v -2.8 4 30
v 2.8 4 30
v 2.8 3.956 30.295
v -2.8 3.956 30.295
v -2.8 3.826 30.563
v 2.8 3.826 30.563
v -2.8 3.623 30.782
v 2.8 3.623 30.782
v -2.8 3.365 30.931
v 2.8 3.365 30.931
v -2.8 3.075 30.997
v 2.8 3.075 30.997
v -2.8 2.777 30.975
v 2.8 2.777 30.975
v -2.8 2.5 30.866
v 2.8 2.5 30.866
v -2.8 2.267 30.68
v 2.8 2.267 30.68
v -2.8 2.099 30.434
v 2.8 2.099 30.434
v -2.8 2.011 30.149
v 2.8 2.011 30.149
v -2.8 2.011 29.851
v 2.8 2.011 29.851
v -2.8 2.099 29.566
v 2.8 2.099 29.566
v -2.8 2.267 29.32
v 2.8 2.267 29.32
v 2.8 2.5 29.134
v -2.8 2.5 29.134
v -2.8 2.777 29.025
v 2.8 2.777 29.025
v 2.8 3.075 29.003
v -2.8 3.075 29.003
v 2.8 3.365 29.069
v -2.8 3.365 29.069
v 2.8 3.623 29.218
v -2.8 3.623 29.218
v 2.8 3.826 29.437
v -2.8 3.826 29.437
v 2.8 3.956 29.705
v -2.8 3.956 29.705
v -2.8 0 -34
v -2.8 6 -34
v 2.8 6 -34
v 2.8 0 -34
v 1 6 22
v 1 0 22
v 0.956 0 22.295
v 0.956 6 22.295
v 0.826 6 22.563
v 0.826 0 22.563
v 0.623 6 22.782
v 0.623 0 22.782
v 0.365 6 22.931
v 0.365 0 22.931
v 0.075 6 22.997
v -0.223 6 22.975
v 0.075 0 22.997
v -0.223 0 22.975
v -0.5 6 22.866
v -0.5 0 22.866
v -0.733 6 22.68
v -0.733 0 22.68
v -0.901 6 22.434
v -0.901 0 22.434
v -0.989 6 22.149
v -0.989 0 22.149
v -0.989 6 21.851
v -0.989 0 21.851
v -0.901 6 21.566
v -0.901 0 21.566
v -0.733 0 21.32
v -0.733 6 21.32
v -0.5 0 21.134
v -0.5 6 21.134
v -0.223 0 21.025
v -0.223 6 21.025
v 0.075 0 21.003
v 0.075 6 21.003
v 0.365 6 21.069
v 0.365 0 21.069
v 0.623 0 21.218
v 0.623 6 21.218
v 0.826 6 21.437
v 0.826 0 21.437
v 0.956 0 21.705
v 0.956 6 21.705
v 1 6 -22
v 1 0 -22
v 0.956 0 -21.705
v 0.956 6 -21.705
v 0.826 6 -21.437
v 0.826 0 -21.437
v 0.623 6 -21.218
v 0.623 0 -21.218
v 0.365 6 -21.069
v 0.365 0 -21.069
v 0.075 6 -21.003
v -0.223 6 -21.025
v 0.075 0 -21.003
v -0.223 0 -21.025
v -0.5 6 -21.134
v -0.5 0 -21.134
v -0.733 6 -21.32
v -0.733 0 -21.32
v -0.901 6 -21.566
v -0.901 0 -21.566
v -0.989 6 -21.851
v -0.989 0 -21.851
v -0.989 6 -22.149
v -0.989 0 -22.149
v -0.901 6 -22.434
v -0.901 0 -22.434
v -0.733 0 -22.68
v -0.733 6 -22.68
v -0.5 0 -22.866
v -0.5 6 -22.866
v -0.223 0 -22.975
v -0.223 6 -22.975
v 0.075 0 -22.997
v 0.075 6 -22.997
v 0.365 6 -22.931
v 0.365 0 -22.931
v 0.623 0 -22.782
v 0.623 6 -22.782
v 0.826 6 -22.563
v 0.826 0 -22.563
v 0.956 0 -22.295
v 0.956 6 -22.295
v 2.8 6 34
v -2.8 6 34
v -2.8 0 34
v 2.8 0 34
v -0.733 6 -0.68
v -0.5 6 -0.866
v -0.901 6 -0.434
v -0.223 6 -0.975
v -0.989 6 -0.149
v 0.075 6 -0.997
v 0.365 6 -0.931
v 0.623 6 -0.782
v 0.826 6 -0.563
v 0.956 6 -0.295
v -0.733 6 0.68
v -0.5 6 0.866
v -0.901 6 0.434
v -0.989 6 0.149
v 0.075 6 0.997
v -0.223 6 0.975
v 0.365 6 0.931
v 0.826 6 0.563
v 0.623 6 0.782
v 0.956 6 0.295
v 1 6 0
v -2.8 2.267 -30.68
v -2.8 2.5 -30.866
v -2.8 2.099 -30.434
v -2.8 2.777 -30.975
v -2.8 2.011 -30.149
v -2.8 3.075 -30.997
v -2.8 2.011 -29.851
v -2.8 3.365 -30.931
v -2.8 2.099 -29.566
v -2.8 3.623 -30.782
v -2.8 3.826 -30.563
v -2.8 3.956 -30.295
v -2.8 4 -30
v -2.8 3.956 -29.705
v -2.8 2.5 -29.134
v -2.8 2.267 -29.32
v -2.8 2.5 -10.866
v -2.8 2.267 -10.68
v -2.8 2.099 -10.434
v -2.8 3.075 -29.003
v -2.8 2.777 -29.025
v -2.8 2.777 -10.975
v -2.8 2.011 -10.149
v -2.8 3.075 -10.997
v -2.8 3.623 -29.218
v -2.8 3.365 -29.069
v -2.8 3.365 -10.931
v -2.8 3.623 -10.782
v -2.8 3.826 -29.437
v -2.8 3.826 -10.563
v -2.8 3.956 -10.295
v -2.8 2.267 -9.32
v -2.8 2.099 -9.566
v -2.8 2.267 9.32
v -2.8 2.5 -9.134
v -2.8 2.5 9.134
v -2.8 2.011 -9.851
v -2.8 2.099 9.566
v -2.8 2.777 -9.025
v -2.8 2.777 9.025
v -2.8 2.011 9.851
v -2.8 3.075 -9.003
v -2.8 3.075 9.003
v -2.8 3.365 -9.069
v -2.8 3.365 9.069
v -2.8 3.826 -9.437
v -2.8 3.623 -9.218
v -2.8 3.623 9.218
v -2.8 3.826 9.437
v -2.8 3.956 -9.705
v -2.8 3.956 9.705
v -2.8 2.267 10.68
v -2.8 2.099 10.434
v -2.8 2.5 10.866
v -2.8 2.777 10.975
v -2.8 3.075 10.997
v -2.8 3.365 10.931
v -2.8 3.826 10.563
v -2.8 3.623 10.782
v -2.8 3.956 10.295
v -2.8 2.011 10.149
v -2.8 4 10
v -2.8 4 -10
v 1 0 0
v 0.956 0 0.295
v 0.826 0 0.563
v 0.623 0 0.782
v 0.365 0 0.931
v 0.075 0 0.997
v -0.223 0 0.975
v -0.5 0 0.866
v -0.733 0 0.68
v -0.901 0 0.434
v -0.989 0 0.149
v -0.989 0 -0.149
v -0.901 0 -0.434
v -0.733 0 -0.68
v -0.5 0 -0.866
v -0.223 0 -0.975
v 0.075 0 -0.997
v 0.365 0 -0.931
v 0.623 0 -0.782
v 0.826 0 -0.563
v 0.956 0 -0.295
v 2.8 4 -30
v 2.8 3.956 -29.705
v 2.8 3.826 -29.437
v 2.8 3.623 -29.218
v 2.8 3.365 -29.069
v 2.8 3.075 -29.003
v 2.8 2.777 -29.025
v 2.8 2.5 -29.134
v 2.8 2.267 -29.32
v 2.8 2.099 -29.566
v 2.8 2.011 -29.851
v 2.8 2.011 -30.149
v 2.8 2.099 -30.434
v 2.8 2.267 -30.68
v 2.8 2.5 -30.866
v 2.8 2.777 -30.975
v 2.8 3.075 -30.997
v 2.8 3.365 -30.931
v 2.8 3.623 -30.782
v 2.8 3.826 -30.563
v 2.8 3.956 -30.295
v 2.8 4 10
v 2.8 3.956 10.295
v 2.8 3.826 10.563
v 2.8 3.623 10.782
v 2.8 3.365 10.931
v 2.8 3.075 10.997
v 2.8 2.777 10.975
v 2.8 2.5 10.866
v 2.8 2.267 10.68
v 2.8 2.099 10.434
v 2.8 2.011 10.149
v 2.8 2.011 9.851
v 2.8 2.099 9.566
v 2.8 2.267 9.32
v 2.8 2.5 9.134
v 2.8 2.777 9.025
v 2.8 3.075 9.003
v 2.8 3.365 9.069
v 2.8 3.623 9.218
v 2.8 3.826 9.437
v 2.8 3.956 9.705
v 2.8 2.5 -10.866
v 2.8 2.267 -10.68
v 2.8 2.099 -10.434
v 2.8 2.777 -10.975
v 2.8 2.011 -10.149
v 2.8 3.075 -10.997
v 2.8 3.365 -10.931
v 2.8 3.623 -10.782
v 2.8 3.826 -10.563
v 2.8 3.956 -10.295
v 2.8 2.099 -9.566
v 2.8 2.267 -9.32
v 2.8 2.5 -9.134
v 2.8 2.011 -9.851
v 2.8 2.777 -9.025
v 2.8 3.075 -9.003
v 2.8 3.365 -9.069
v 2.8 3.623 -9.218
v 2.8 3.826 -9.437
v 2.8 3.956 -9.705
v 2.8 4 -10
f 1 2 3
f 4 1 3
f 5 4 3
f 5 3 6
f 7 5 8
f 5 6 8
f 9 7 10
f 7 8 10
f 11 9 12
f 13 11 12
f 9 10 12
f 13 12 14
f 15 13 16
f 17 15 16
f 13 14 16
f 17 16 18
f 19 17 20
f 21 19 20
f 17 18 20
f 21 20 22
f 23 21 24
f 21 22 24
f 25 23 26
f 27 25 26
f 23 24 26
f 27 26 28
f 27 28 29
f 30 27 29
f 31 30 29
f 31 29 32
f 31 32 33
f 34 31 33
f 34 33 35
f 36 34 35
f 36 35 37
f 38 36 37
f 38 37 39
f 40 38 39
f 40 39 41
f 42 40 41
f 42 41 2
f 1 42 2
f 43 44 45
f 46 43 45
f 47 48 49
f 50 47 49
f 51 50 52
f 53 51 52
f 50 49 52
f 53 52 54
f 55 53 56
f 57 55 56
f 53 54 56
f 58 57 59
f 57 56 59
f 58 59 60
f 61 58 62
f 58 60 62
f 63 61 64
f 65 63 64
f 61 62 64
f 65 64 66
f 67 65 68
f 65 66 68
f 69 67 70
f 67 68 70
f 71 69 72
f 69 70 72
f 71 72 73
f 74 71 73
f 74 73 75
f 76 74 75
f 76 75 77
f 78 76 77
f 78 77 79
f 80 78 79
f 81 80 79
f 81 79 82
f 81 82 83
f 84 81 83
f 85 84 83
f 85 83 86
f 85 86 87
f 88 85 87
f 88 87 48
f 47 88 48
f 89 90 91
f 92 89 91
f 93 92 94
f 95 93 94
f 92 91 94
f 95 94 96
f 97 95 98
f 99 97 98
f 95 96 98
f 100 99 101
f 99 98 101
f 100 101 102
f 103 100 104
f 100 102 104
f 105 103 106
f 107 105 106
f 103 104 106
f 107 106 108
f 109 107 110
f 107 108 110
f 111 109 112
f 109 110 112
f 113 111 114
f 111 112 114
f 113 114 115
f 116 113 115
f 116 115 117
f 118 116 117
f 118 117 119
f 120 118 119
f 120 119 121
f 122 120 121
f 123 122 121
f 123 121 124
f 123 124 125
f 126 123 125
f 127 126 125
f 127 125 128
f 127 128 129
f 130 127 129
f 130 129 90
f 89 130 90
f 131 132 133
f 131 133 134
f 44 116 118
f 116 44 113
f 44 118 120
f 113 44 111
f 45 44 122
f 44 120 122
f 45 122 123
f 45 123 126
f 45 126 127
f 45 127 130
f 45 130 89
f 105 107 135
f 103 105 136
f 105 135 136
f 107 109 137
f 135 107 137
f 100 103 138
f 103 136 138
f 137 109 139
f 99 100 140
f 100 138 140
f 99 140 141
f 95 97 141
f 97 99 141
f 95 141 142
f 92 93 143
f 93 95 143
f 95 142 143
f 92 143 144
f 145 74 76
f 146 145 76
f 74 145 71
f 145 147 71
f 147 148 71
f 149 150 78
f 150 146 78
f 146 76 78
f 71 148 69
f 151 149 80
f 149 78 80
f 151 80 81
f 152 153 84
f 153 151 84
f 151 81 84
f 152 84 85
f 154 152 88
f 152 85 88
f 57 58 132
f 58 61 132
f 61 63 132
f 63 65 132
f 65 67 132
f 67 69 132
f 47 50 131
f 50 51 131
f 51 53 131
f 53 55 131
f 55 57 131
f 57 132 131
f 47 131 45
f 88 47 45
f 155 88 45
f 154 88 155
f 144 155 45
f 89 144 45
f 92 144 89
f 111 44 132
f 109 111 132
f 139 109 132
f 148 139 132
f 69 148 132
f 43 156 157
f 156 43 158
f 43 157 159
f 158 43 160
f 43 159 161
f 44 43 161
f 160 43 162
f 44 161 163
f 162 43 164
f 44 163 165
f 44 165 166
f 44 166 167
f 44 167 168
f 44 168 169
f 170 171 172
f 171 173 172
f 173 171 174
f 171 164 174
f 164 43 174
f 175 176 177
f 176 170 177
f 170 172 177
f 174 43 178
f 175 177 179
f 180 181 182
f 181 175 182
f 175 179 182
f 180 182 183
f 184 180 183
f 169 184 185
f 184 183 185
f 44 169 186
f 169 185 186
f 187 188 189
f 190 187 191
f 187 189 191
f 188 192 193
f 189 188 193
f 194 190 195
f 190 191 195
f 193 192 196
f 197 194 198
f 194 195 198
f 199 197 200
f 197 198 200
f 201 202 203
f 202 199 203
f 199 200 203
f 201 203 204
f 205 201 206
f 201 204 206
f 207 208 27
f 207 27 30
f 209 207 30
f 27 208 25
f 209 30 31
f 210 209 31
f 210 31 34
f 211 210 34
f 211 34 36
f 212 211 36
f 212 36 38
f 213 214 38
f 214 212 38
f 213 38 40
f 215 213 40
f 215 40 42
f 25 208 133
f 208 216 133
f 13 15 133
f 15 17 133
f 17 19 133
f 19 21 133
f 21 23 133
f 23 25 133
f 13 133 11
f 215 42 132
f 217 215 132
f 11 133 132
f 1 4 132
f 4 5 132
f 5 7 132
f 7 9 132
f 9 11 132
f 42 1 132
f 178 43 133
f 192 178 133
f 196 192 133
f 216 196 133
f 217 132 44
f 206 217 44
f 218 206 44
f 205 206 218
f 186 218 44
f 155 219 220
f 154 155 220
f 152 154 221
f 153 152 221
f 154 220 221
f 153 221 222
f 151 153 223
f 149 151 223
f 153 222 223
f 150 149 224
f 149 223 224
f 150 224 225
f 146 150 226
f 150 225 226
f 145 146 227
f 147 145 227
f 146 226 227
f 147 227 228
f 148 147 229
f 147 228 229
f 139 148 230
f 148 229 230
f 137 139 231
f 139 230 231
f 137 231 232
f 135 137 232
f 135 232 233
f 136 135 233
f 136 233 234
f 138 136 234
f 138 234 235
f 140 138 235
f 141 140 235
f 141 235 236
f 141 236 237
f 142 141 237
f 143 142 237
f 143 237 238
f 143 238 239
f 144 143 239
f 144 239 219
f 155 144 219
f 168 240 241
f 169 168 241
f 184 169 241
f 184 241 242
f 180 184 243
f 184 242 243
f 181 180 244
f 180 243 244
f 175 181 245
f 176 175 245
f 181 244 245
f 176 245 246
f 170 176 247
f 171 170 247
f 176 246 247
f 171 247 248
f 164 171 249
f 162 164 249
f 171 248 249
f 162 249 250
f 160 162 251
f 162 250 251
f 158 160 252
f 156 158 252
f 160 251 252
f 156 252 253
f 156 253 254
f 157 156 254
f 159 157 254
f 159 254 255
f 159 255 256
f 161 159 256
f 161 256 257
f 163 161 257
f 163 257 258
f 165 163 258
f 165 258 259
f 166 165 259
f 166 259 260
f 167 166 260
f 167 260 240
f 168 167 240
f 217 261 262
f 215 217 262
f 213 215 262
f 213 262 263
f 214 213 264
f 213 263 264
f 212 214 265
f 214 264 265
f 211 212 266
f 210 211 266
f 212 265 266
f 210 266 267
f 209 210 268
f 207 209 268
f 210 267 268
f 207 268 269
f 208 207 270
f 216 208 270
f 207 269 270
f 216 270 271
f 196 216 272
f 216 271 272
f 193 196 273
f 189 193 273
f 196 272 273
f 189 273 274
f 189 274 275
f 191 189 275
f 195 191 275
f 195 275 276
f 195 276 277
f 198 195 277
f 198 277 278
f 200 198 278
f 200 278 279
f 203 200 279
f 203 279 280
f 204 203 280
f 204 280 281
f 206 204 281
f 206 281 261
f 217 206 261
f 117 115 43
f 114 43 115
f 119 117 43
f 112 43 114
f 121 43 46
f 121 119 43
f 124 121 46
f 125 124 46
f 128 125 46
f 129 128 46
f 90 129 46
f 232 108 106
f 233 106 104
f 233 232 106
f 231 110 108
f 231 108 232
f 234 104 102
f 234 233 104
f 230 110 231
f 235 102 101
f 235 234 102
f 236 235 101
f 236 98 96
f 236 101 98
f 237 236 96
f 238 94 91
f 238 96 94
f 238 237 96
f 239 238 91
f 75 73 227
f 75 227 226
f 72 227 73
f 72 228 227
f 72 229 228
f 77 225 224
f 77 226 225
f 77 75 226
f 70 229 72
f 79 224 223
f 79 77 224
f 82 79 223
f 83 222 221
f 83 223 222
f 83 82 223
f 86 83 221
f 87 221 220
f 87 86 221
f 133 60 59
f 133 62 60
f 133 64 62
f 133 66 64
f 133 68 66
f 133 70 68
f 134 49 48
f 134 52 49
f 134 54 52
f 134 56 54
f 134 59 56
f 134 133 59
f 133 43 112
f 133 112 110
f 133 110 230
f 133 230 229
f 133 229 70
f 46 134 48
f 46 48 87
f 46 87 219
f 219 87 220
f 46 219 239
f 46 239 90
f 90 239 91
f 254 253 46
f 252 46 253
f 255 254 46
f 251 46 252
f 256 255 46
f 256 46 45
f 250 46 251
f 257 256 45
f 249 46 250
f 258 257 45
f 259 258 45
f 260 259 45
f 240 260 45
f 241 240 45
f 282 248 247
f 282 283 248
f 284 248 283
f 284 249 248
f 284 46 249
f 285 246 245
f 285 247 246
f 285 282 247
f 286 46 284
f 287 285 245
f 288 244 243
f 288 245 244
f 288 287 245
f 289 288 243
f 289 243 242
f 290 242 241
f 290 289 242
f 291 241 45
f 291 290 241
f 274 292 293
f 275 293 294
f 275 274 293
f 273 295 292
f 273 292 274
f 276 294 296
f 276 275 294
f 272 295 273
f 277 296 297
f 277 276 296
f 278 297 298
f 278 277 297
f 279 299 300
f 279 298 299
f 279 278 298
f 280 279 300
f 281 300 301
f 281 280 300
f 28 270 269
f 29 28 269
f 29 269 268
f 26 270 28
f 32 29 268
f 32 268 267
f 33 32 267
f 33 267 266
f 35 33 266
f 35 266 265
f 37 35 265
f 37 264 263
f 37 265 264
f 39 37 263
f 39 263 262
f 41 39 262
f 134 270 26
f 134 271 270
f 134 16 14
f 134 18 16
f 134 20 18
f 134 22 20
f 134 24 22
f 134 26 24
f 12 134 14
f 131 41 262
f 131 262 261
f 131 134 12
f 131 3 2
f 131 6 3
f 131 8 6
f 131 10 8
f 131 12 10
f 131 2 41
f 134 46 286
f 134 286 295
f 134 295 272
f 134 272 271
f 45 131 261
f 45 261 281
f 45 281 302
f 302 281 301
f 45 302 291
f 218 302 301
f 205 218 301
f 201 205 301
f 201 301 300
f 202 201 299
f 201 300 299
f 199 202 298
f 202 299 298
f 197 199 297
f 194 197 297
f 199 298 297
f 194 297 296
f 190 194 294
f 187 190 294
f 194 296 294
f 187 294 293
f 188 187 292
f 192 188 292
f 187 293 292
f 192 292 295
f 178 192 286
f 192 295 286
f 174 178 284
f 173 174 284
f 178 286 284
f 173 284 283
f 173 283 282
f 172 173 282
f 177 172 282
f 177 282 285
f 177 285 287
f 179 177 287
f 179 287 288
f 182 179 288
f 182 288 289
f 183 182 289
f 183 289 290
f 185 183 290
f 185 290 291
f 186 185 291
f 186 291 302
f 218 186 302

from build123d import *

# Parameters (mm, degrees)
SKETCH_1_W          = 5.6
SKETCH_1_H          = 6
EXTRUDE_1_DEPTH     = 34
CUT_EXTRUDE_3_REACH = 36.639
SKETCH_4_R          = 1
CUT_EXTRUDE_4_REACH = 36.977
SKETCH_5_R          = 1


with BuildPart() as part:
    # 草图1 → 凸台-拉伸1 (new, symmetric)
    with BuildSketch(Plane.XY):
        with Locations((0, 3)):
            Rectangle(SKETCH_1_W, SKETCH_1_H)
    extrude(amount=EXTRUDE_1_DEPTH, both=True)

    # 草图4 → 切除-拉伸3 (cut, up to next)
    with BuildSketch(Plane.XZ, mode=Mode.PRIVATE) as cut_extrude_3_sk1:
        Circle(SKETCH_4_R)
    cut_extrude_3_tool1 = extrude(cut_extrude_3_sk1.sketch, amount=-CUT_EXTRUDE_3_REACH, mode=Mode.PRIVATE) & part.part
    # 草图4 → 切除-拉伸3 (cut, up to next)
    with BuildSketch(Plane.XZ, mode=Mode.PRIVATE) as cut_extrude_3_sk2:
        with Locations((0, 22)):
            Circle(SKETCH_4_R)
    cut_extrude_3_tool2 = extrude(cut_extrude_3_sk2.sketch, amount=-CUT_EXTRUDE_3_REACH, mode=Mode.PRIVATE) & part.part
    # 草图4 → 切除-拉伸3 (cut, up to next)
    with BuildSketch(Plane.XZ, mode=Mode.PRIVATE) as cut_extrude_3_sk3:
        with Locations((0, -22)):
            Circle(SKETCH_4_R)
    cut_extrude_3_tool3 = extrude(cut_extrude_3_sk3.sketch, amount=-CUT_EXTRUDE_3_REACH, mode=Mode.PRIVATE) & part.part
    add(cut_extrude_3_tool1.solids().sort_by_distance((0, 0, 0))[0], mode=Mode.SUBTRACT)
    add(cut_extrude_3_tool2.solids().sort_by_distance((0, 0, 22))[0], mode=Mode.SUBTRACT)
    add(cut_extrude_3_tool3.solids().sort_by_distance((0, 0, -22))[0], mode=Mode.SUBTRACT)

    # 草图5 → 切除-拉伸4 (cut, up to next)
    with BuildSketch(Plane(origin=(2.8, 0, 0), x_dir=(0, 0, -1), z_dir=(1, 0, 0)), mode=Mode.PRIVATE) as cut_extrude_4_sk1:
        with Locations(Location((-30, 3, 0), (0, 0, 90))):
            Circle(SKETCH_5_R)
    cut_extrude_4_tool1 = extrude(cut_extrude_4_sk1.sketch, amount=-CUT_EXTRUDE_4_REACH, mode=Mode.PRIVATE) & part.part
    # 草图5 → 切除-拉伸4 (cut, up to next)
    with BuildSketch(Plane(origin=(2.8, 0, 0), x_dir=(0, 0, -1), z_dir=(1, 0, 0)), mode=Mode.PRIVATE) as cut_extrude_4_sk2:
        with Locations(Location((-10, 3, 0), (0, 0, 90))):
            Circle(SKETCH_5_R)
    cut_extrude_4_tool2 = extrude(cut_extrude_4_sk2.sketch, amount=-CUT_EXTRUDE_4_REACH, mode=Mode.PRIVATE) & part.part
    # 草图5 → 切除-拉伸4 (cut, up to next)
    with BuildSketch(Plane(origin=(2.8, 0, 0), x_dir=(0, 0, -1), z_dir=(1, 0, 0)), mode=Mode.PRIVATE) as cut_extrude_4_sk3:
        with Locations(Location((10, 3, 0), (0, 0, 90))):
            Circle(SKETCH_5_R)
    cut_extrude_4_tool3 = extrude(cut_extrude_4_sk3.sketch, amount=-CUT_EXTRUDE_4_REACH, mode=Mode.PRIVATE) & part.part
    # 草图5 → 切除-拉伸4 (cut, up to next)
    with BuildSketch(Plane(origin=(2.8, 0, 0), x_dir=(0, 0, -1), z_dir=(1, 0, 0)), mode=Mode.PRIVATE) as cut_extrude_4_sk4:
        with Locations(Location((30, 3, 0), (0, 0, 90))):
            Circle(SKETCH_5_R)
    cut_extrude_4_tool4 = extrude(cut_extrude_4_sk4.sketch, amount=-CUT_EXTRUDE_4_REACH, mode=Mode.PRIVATE) & part.part
    add(cut_extrude_4_tool1.solids().sort_by_distance((2.8, 3, 30))[0], mode=Mode.SUBTRACT)
    add(cut_extrude_4_tool2.solids().sort_by_distance((2.8, 3, 10))[0], mode=Mode.SUBTRACT)
    add(cut_extrude_4_tool3.solids().sort_by_distance((2.8, 3, -10))[0], mode=Mode.SUBTRACT)
    add(cut_extrude_4_tool4.solids().sort_by_distance((2.8, 3, -30))[0], mode=Mode.SUBTRACT)


solid = part.part
